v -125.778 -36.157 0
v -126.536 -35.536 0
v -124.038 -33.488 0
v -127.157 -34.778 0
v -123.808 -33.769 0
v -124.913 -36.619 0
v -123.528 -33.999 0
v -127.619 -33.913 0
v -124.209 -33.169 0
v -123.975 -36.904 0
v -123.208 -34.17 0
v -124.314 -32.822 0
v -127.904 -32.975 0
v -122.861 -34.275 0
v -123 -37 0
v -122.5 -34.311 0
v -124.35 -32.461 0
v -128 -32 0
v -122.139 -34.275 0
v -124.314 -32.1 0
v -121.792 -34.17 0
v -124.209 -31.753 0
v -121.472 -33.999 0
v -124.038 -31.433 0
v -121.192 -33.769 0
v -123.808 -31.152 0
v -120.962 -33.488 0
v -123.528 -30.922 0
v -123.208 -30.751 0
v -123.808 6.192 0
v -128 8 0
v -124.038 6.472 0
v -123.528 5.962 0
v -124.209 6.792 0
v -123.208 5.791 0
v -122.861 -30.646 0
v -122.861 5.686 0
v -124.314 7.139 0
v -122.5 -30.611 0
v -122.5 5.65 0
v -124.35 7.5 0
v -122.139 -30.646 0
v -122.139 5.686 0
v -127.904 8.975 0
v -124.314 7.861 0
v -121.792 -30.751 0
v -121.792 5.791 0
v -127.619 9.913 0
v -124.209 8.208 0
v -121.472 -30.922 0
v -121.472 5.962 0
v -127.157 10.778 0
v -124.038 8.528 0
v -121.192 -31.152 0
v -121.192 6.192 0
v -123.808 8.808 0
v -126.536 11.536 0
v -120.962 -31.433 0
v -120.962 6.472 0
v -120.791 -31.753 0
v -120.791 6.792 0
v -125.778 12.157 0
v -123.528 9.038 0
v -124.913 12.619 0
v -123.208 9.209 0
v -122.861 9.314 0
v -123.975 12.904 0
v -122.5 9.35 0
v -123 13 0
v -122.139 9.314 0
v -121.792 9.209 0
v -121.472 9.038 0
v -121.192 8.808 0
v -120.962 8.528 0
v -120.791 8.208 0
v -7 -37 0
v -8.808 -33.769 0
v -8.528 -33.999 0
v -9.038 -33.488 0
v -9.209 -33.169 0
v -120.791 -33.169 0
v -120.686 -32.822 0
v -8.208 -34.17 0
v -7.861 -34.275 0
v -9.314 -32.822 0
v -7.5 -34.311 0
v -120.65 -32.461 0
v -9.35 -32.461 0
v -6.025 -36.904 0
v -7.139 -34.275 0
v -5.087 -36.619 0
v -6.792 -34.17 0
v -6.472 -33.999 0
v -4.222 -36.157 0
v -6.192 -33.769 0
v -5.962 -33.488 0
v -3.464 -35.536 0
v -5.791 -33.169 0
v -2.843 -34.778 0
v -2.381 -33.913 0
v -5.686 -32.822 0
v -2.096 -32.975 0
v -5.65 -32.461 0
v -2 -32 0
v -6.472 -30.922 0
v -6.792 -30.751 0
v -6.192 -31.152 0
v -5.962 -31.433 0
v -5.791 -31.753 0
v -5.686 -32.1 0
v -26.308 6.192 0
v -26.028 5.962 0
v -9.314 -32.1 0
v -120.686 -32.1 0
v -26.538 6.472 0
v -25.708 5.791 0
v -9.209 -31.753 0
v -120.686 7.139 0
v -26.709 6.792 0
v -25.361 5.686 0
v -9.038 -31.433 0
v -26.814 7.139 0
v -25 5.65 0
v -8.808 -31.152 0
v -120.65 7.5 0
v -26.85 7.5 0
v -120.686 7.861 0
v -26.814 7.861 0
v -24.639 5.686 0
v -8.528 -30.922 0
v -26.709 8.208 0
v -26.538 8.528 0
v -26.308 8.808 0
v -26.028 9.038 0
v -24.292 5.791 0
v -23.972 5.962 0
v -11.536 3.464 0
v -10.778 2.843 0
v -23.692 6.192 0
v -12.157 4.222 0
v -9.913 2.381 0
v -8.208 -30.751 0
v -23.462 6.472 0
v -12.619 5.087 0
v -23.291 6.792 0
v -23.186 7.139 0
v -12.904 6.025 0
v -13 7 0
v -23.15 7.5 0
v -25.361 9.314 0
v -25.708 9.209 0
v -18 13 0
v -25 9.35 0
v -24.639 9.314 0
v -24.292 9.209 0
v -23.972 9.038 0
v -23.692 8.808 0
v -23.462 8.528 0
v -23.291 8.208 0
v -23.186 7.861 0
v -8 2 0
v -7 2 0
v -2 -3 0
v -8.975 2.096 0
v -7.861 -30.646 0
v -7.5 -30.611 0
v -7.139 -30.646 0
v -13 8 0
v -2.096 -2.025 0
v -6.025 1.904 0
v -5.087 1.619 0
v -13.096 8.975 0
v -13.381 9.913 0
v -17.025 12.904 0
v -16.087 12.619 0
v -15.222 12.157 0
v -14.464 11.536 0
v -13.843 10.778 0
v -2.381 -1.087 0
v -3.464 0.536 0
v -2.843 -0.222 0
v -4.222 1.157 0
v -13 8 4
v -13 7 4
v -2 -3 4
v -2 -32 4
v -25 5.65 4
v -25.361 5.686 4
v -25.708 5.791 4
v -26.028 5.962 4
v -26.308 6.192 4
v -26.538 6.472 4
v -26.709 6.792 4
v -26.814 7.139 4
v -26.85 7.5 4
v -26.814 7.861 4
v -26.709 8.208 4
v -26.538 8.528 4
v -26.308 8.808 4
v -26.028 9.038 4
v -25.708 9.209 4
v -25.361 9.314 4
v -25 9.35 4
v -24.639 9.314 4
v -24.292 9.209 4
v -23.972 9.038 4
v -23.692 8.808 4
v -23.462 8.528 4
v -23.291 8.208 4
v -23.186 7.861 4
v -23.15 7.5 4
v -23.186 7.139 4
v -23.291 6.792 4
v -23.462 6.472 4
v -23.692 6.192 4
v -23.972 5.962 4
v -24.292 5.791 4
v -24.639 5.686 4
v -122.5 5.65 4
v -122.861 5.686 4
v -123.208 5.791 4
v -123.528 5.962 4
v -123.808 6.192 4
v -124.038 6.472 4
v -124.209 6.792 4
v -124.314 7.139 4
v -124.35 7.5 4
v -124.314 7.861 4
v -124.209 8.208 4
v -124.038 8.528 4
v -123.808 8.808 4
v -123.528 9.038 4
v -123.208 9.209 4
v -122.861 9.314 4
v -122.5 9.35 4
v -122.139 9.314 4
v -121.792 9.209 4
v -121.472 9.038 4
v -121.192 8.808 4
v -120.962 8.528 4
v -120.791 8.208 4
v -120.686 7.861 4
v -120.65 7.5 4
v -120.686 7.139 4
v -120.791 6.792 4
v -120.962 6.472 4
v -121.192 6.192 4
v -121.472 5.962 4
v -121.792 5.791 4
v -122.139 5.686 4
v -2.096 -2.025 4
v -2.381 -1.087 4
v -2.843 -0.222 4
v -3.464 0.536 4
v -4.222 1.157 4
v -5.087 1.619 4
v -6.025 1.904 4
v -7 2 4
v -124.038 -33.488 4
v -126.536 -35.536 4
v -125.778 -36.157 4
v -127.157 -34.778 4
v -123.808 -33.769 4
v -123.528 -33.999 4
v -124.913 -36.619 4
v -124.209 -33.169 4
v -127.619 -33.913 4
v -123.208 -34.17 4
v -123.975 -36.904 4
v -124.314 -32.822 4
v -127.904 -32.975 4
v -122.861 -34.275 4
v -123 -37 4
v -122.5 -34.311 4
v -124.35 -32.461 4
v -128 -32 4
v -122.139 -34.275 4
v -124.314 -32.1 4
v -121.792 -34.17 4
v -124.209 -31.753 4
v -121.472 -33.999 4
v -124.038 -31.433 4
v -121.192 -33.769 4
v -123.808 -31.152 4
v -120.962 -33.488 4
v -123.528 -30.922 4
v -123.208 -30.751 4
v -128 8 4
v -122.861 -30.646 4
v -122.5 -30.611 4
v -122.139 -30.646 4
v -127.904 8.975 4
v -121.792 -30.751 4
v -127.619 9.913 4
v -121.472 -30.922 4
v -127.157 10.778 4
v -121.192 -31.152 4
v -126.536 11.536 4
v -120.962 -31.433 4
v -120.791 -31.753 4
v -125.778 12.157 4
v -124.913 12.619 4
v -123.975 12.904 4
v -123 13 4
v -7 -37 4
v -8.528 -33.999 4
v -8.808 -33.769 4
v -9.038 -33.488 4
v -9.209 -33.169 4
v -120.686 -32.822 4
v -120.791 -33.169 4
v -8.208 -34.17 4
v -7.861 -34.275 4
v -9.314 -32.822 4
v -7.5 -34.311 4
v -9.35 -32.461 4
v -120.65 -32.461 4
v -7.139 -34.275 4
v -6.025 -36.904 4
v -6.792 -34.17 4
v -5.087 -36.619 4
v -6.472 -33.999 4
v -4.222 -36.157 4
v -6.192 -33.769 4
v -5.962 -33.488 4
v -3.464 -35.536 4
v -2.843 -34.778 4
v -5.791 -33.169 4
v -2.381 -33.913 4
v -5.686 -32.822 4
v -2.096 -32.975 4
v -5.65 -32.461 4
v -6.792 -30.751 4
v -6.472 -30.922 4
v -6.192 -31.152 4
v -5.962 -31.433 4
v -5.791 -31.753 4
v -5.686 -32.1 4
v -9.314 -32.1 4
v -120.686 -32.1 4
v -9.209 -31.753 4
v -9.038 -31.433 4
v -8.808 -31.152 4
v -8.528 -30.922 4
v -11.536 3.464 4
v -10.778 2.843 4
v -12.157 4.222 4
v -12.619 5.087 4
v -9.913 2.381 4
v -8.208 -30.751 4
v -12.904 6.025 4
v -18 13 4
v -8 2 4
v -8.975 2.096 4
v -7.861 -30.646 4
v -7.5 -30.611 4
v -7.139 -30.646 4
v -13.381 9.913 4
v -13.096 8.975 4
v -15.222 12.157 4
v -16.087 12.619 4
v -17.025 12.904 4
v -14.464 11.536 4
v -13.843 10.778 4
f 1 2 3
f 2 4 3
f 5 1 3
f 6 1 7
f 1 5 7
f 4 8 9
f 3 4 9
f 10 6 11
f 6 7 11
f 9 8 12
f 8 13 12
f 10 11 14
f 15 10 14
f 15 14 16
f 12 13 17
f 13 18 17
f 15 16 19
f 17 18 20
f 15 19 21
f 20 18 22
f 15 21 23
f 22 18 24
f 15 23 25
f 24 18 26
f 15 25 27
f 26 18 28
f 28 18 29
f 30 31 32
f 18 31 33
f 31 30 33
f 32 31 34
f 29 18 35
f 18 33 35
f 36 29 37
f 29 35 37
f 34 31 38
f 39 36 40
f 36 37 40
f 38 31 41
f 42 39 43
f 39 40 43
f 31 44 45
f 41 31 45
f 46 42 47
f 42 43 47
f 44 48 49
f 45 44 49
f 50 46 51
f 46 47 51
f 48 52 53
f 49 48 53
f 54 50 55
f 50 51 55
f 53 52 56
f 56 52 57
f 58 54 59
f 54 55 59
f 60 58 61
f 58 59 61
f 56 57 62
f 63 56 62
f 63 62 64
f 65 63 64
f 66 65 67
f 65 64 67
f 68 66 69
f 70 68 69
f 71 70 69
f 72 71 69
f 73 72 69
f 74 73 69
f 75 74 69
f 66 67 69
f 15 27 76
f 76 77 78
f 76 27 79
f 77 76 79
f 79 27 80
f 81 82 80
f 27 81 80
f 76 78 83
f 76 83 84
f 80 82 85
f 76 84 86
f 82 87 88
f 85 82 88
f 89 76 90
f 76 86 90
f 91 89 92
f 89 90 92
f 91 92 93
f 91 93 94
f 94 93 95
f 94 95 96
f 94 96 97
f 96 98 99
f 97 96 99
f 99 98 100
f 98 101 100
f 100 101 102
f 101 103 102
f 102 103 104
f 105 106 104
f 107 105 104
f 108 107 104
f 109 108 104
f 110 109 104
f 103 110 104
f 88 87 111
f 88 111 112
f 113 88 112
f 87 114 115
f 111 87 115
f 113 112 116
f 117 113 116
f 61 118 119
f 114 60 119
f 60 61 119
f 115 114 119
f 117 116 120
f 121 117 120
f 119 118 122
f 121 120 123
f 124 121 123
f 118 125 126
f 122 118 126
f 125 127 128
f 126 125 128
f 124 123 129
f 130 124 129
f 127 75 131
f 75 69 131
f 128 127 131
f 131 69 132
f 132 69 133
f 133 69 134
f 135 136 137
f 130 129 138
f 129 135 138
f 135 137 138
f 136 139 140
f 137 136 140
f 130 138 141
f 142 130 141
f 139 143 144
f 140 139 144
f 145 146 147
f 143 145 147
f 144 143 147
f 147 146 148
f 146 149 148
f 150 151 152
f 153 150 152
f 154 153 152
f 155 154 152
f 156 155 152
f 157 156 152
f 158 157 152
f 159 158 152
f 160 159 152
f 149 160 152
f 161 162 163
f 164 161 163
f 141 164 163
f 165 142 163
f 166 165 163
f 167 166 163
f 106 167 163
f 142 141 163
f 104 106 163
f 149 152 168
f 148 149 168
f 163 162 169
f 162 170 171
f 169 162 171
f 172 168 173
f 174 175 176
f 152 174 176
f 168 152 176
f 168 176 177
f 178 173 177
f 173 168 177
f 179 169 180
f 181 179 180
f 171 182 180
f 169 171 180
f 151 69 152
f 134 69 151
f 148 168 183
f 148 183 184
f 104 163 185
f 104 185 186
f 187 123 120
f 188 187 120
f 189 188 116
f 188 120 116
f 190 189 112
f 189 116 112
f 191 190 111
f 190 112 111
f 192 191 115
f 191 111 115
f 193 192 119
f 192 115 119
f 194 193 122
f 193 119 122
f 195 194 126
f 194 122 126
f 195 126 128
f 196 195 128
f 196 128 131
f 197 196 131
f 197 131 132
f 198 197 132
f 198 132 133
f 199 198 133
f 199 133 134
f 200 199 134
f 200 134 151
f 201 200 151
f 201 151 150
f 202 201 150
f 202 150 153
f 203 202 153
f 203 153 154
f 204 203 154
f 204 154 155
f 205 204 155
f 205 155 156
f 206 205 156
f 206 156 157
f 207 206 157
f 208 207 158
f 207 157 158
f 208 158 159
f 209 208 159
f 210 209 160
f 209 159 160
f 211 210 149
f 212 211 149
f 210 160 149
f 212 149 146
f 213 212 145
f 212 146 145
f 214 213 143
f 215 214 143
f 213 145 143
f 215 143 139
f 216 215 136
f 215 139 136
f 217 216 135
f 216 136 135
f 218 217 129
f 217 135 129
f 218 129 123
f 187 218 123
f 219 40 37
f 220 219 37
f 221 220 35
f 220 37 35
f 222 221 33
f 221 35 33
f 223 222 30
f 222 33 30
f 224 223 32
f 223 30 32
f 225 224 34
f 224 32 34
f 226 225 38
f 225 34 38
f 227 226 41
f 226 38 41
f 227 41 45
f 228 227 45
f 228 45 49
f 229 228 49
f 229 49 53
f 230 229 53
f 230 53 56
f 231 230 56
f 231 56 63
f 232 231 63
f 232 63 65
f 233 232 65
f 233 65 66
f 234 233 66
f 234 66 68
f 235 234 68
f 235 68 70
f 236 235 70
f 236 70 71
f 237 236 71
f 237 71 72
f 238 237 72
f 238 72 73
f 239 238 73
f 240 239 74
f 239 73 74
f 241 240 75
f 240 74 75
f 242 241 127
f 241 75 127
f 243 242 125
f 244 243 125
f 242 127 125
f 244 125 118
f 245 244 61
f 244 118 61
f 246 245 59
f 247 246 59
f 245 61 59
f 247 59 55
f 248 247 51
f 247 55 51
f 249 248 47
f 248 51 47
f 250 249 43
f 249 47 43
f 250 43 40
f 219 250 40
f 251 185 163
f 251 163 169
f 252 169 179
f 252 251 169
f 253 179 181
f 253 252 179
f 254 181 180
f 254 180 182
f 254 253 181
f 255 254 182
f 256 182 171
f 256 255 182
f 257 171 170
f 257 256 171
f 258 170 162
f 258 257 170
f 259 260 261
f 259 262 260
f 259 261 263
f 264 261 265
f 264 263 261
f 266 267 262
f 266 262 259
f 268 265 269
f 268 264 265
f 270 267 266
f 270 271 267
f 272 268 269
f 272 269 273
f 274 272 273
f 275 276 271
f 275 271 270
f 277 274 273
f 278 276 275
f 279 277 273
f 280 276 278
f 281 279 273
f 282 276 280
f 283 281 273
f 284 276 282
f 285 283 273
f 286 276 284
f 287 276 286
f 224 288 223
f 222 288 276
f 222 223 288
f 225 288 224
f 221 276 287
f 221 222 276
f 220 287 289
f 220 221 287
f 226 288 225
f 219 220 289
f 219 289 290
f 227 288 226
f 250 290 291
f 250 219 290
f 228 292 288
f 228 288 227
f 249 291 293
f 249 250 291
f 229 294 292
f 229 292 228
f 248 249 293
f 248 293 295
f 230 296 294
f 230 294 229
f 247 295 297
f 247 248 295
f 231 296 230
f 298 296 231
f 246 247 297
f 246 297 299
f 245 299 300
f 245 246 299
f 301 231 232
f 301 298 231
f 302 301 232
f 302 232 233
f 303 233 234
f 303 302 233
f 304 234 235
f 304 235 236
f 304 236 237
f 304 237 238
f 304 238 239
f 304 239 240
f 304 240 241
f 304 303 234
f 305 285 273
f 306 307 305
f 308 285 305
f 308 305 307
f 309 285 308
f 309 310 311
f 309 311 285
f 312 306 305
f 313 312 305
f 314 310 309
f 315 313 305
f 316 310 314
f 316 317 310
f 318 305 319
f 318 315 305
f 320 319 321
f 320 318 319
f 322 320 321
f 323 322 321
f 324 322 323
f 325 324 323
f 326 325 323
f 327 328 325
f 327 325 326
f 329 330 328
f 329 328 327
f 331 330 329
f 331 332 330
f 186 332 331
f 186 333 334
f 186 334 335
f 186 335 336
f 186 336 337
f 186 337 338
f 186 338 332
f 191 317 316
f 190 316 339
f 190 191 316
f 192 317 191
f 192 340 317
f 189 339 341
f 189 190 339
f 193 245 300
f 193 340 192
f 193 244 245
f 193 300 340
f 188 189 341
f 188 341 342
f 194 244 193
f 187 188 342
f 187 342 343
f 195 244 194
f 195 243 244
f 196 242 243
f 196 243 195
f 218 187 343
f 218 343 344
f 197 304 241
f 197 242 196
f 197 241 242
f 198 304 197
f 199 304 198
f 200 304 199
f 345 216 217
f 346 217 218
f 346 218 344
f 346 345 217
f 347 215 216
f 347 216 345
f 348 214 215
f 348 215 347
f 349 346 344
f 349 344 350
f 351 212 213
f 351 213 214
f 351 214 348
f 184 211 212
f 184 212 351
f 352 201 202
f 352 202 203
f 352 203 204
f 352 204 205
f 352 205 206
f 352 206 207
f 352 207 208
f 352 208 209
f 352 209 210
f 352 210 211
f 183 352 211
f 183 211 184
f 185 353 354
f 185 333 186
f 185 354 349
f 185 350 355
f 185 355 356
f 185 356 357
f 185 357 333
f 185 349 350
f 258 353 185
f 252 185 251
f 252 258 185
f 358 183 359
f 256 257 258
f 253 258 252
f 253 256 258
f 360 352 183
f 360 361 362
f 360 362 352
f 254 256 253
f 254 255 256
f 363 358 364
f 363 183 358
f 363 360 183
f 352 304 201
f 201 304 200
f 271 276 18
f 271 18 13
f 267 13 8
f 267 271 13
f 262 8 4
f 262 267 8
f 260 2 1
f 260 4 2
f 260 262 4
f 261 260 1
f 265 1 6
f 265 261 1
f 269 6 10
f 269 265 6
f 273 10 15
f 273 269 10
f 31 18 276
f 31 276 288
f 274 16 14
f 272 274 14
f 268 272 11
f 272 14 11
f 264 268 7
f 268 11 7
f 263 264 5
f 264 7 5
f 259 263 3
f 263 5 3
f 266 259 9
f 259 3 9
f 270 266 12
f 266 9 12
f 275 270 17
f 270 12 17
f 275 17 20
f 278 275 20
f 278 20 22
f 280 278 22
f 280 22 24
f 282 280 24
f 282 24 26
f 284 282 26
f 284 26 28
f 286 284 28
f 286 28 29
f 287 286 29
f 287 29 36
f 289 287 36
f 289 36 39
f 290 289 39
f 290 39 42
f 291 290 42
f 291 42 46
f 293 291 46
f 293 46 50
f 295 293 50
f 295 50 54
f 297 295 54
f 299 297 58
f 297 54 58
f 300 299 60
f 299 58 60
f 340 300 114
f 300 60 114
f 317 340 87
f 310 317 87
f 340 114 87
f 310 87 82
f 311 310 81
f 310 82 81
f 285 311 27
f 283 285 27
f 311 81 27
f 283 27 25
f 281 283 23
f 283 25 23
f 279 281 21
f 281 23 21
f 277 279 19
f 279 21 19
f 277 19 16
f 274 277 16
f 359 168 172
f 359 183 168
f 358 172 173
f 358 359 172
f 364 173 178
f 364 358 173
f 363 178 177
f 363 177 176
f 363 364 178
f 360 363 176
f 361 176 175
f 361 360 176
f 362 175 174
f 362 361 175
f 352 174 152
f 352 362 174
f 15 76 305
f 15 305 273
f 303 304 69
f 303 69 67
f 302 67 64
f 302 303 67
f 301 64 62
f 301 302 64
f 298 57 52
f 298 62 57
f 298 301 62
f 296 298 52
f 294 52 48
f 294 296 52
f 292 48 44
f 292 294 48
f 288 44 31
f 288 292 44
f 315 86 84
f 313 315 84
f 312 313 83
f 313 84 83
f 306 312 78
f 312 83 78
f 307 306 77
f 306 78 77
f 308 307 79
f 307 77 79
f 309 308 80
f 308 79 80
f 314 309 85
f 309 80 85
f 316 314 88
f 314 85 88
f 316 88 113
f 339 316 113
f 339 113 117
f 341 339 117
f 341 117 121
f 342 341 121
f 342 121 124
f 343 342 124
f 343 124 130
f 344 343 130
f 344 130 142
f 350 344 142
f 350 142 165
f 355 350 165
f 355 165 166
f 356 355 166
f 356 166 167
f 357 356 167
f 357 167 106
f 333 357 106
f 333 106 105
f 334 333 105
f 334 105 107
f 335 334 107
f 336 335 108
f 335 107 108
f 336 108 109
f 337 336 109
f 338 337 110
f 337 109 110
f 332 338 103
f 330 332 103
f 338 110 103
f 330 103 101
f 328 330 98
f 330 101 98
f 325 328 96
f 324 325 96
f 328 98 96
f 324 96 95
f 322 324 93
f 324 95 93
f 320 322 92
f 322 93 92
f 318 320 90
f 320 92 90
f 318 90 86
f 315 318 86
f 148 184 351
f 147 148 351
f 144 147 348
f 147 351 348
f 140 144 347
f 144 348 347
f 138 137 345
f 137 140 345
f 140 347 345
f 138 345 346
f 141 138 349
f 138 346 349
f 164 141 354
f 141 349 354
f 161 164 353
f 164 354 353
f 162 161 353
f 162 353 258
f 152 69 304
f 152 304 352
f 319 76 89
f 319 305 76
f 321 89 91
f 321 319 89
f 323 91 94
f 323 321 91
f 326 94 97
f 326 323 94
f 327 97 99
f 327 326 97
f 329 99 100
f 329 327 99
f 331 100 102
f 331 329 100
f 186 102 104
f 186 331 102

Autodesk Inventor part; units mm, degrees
ref_plane "YZ Plane" through (0, 0, 0) normal (1, 0, 0) x (0, 1, 0)
ref_plane "XZ Plane" through (0, 0, 0) normal (0, 1, 0) x (-1, 0, 0)
ref_plane "XY Plane" through (0, 0, 0) normal (0, 0, 1) x (1, 0, 0)
sketch "Sketch1" plane through (0, 0, 0) normal (0, 0, 1) x (1, 0, 0)
  line L0 (0, 0) -> (0, 15)
  line L1 (0, 15) -> (-15, 15)
  line L2 (-15, 0) -> (-15, 15)
  line L3 (0, 0) -> (-15, 0)
  line L4 (-15, 15) -> (-515, 15)
  line L5 (-15, 0) -> (-515, 0)
  line L6 (-15, -360) -> (-15, 0)
  line L7 (0, -360) -> (0, 0)
  line L8 (-115, -360) -> (-115, 0)
  line L9 (-130, -360) -> (-130, 0)
  line L10 (-128, 13) -> (-2, 13)
  line L11 (-2, 13) -> (-2, -37)
  line L12 (-2, -37) -> (-128, -37)
  line L13 (-128, -37) -> (-128, 13)
  line L14 (-13, 13) -> (-13, 2)
  line L15 (-13, 2) -> (-2, 2)
extrude "Extrusion1" add sketch "Sketch1" along normal blind 4 contours L11 L12 L6 L3 | L3 L2 L10 L14 L15 L11 | L5 L13 L10 L2 | L6 L12 L8 L5 | L8 L12 L13 L5
sketch "Sketch2" plane through (0, 0, 4) normal (0, 0, 1) x (1, 0, 0)
  line L0 (-13, 13) -> (-128, 13) projected
  line L1 (-128, 13) -> (-128, -37) projected
  line L2 (-128, -37) -> (-2, -37) projected
  line L3 (-2, -37) -> (-2, 2) projected
  line L4 (-13, 2) -> (-13, 13) projected
  line L5 (-2, 2) -> (-13, 2) projected
  point P0 (0, 0)
  point P1 (-122.5, -32.4606)
  point P2 (-122.5, 7.5)
  point P3 (-25, 7.5)
  point P4 (-7.5, -32.4606)
  dimension "d6" = 5.5
  dimension "d7" = 5.5
  dimension "d8" = 5.5
  dimension "d9" = 23
hole "Hole1" at (-122.5, -32.4606, 4) at (-122.5, 7.5, 4) at (-25, 7.5, 4) at (-7.5, -32.4606, 4) direction (0, 0, -1) diameter 3.7 depth 8 tip angle 118
fillet "Fillet1" radius 5 6 edges at (-2, -37, 2) (-128, -37, 2) (-128, 13, 2) (-13, 13, 2) (-13, 2, 2) (-2, 2, 2)
equation "\"d7\" = d6"
equation "\"d8\" = d6"
equation "\"d1\" = d0"
equation "\"d3\" = d1"
equation "\"d21\" = d20"
equation "\"d0\" = 2"
equation "\"d20\" = 2"
properties part number "Frame_Foot_Solid" material "ABS Plastic"
